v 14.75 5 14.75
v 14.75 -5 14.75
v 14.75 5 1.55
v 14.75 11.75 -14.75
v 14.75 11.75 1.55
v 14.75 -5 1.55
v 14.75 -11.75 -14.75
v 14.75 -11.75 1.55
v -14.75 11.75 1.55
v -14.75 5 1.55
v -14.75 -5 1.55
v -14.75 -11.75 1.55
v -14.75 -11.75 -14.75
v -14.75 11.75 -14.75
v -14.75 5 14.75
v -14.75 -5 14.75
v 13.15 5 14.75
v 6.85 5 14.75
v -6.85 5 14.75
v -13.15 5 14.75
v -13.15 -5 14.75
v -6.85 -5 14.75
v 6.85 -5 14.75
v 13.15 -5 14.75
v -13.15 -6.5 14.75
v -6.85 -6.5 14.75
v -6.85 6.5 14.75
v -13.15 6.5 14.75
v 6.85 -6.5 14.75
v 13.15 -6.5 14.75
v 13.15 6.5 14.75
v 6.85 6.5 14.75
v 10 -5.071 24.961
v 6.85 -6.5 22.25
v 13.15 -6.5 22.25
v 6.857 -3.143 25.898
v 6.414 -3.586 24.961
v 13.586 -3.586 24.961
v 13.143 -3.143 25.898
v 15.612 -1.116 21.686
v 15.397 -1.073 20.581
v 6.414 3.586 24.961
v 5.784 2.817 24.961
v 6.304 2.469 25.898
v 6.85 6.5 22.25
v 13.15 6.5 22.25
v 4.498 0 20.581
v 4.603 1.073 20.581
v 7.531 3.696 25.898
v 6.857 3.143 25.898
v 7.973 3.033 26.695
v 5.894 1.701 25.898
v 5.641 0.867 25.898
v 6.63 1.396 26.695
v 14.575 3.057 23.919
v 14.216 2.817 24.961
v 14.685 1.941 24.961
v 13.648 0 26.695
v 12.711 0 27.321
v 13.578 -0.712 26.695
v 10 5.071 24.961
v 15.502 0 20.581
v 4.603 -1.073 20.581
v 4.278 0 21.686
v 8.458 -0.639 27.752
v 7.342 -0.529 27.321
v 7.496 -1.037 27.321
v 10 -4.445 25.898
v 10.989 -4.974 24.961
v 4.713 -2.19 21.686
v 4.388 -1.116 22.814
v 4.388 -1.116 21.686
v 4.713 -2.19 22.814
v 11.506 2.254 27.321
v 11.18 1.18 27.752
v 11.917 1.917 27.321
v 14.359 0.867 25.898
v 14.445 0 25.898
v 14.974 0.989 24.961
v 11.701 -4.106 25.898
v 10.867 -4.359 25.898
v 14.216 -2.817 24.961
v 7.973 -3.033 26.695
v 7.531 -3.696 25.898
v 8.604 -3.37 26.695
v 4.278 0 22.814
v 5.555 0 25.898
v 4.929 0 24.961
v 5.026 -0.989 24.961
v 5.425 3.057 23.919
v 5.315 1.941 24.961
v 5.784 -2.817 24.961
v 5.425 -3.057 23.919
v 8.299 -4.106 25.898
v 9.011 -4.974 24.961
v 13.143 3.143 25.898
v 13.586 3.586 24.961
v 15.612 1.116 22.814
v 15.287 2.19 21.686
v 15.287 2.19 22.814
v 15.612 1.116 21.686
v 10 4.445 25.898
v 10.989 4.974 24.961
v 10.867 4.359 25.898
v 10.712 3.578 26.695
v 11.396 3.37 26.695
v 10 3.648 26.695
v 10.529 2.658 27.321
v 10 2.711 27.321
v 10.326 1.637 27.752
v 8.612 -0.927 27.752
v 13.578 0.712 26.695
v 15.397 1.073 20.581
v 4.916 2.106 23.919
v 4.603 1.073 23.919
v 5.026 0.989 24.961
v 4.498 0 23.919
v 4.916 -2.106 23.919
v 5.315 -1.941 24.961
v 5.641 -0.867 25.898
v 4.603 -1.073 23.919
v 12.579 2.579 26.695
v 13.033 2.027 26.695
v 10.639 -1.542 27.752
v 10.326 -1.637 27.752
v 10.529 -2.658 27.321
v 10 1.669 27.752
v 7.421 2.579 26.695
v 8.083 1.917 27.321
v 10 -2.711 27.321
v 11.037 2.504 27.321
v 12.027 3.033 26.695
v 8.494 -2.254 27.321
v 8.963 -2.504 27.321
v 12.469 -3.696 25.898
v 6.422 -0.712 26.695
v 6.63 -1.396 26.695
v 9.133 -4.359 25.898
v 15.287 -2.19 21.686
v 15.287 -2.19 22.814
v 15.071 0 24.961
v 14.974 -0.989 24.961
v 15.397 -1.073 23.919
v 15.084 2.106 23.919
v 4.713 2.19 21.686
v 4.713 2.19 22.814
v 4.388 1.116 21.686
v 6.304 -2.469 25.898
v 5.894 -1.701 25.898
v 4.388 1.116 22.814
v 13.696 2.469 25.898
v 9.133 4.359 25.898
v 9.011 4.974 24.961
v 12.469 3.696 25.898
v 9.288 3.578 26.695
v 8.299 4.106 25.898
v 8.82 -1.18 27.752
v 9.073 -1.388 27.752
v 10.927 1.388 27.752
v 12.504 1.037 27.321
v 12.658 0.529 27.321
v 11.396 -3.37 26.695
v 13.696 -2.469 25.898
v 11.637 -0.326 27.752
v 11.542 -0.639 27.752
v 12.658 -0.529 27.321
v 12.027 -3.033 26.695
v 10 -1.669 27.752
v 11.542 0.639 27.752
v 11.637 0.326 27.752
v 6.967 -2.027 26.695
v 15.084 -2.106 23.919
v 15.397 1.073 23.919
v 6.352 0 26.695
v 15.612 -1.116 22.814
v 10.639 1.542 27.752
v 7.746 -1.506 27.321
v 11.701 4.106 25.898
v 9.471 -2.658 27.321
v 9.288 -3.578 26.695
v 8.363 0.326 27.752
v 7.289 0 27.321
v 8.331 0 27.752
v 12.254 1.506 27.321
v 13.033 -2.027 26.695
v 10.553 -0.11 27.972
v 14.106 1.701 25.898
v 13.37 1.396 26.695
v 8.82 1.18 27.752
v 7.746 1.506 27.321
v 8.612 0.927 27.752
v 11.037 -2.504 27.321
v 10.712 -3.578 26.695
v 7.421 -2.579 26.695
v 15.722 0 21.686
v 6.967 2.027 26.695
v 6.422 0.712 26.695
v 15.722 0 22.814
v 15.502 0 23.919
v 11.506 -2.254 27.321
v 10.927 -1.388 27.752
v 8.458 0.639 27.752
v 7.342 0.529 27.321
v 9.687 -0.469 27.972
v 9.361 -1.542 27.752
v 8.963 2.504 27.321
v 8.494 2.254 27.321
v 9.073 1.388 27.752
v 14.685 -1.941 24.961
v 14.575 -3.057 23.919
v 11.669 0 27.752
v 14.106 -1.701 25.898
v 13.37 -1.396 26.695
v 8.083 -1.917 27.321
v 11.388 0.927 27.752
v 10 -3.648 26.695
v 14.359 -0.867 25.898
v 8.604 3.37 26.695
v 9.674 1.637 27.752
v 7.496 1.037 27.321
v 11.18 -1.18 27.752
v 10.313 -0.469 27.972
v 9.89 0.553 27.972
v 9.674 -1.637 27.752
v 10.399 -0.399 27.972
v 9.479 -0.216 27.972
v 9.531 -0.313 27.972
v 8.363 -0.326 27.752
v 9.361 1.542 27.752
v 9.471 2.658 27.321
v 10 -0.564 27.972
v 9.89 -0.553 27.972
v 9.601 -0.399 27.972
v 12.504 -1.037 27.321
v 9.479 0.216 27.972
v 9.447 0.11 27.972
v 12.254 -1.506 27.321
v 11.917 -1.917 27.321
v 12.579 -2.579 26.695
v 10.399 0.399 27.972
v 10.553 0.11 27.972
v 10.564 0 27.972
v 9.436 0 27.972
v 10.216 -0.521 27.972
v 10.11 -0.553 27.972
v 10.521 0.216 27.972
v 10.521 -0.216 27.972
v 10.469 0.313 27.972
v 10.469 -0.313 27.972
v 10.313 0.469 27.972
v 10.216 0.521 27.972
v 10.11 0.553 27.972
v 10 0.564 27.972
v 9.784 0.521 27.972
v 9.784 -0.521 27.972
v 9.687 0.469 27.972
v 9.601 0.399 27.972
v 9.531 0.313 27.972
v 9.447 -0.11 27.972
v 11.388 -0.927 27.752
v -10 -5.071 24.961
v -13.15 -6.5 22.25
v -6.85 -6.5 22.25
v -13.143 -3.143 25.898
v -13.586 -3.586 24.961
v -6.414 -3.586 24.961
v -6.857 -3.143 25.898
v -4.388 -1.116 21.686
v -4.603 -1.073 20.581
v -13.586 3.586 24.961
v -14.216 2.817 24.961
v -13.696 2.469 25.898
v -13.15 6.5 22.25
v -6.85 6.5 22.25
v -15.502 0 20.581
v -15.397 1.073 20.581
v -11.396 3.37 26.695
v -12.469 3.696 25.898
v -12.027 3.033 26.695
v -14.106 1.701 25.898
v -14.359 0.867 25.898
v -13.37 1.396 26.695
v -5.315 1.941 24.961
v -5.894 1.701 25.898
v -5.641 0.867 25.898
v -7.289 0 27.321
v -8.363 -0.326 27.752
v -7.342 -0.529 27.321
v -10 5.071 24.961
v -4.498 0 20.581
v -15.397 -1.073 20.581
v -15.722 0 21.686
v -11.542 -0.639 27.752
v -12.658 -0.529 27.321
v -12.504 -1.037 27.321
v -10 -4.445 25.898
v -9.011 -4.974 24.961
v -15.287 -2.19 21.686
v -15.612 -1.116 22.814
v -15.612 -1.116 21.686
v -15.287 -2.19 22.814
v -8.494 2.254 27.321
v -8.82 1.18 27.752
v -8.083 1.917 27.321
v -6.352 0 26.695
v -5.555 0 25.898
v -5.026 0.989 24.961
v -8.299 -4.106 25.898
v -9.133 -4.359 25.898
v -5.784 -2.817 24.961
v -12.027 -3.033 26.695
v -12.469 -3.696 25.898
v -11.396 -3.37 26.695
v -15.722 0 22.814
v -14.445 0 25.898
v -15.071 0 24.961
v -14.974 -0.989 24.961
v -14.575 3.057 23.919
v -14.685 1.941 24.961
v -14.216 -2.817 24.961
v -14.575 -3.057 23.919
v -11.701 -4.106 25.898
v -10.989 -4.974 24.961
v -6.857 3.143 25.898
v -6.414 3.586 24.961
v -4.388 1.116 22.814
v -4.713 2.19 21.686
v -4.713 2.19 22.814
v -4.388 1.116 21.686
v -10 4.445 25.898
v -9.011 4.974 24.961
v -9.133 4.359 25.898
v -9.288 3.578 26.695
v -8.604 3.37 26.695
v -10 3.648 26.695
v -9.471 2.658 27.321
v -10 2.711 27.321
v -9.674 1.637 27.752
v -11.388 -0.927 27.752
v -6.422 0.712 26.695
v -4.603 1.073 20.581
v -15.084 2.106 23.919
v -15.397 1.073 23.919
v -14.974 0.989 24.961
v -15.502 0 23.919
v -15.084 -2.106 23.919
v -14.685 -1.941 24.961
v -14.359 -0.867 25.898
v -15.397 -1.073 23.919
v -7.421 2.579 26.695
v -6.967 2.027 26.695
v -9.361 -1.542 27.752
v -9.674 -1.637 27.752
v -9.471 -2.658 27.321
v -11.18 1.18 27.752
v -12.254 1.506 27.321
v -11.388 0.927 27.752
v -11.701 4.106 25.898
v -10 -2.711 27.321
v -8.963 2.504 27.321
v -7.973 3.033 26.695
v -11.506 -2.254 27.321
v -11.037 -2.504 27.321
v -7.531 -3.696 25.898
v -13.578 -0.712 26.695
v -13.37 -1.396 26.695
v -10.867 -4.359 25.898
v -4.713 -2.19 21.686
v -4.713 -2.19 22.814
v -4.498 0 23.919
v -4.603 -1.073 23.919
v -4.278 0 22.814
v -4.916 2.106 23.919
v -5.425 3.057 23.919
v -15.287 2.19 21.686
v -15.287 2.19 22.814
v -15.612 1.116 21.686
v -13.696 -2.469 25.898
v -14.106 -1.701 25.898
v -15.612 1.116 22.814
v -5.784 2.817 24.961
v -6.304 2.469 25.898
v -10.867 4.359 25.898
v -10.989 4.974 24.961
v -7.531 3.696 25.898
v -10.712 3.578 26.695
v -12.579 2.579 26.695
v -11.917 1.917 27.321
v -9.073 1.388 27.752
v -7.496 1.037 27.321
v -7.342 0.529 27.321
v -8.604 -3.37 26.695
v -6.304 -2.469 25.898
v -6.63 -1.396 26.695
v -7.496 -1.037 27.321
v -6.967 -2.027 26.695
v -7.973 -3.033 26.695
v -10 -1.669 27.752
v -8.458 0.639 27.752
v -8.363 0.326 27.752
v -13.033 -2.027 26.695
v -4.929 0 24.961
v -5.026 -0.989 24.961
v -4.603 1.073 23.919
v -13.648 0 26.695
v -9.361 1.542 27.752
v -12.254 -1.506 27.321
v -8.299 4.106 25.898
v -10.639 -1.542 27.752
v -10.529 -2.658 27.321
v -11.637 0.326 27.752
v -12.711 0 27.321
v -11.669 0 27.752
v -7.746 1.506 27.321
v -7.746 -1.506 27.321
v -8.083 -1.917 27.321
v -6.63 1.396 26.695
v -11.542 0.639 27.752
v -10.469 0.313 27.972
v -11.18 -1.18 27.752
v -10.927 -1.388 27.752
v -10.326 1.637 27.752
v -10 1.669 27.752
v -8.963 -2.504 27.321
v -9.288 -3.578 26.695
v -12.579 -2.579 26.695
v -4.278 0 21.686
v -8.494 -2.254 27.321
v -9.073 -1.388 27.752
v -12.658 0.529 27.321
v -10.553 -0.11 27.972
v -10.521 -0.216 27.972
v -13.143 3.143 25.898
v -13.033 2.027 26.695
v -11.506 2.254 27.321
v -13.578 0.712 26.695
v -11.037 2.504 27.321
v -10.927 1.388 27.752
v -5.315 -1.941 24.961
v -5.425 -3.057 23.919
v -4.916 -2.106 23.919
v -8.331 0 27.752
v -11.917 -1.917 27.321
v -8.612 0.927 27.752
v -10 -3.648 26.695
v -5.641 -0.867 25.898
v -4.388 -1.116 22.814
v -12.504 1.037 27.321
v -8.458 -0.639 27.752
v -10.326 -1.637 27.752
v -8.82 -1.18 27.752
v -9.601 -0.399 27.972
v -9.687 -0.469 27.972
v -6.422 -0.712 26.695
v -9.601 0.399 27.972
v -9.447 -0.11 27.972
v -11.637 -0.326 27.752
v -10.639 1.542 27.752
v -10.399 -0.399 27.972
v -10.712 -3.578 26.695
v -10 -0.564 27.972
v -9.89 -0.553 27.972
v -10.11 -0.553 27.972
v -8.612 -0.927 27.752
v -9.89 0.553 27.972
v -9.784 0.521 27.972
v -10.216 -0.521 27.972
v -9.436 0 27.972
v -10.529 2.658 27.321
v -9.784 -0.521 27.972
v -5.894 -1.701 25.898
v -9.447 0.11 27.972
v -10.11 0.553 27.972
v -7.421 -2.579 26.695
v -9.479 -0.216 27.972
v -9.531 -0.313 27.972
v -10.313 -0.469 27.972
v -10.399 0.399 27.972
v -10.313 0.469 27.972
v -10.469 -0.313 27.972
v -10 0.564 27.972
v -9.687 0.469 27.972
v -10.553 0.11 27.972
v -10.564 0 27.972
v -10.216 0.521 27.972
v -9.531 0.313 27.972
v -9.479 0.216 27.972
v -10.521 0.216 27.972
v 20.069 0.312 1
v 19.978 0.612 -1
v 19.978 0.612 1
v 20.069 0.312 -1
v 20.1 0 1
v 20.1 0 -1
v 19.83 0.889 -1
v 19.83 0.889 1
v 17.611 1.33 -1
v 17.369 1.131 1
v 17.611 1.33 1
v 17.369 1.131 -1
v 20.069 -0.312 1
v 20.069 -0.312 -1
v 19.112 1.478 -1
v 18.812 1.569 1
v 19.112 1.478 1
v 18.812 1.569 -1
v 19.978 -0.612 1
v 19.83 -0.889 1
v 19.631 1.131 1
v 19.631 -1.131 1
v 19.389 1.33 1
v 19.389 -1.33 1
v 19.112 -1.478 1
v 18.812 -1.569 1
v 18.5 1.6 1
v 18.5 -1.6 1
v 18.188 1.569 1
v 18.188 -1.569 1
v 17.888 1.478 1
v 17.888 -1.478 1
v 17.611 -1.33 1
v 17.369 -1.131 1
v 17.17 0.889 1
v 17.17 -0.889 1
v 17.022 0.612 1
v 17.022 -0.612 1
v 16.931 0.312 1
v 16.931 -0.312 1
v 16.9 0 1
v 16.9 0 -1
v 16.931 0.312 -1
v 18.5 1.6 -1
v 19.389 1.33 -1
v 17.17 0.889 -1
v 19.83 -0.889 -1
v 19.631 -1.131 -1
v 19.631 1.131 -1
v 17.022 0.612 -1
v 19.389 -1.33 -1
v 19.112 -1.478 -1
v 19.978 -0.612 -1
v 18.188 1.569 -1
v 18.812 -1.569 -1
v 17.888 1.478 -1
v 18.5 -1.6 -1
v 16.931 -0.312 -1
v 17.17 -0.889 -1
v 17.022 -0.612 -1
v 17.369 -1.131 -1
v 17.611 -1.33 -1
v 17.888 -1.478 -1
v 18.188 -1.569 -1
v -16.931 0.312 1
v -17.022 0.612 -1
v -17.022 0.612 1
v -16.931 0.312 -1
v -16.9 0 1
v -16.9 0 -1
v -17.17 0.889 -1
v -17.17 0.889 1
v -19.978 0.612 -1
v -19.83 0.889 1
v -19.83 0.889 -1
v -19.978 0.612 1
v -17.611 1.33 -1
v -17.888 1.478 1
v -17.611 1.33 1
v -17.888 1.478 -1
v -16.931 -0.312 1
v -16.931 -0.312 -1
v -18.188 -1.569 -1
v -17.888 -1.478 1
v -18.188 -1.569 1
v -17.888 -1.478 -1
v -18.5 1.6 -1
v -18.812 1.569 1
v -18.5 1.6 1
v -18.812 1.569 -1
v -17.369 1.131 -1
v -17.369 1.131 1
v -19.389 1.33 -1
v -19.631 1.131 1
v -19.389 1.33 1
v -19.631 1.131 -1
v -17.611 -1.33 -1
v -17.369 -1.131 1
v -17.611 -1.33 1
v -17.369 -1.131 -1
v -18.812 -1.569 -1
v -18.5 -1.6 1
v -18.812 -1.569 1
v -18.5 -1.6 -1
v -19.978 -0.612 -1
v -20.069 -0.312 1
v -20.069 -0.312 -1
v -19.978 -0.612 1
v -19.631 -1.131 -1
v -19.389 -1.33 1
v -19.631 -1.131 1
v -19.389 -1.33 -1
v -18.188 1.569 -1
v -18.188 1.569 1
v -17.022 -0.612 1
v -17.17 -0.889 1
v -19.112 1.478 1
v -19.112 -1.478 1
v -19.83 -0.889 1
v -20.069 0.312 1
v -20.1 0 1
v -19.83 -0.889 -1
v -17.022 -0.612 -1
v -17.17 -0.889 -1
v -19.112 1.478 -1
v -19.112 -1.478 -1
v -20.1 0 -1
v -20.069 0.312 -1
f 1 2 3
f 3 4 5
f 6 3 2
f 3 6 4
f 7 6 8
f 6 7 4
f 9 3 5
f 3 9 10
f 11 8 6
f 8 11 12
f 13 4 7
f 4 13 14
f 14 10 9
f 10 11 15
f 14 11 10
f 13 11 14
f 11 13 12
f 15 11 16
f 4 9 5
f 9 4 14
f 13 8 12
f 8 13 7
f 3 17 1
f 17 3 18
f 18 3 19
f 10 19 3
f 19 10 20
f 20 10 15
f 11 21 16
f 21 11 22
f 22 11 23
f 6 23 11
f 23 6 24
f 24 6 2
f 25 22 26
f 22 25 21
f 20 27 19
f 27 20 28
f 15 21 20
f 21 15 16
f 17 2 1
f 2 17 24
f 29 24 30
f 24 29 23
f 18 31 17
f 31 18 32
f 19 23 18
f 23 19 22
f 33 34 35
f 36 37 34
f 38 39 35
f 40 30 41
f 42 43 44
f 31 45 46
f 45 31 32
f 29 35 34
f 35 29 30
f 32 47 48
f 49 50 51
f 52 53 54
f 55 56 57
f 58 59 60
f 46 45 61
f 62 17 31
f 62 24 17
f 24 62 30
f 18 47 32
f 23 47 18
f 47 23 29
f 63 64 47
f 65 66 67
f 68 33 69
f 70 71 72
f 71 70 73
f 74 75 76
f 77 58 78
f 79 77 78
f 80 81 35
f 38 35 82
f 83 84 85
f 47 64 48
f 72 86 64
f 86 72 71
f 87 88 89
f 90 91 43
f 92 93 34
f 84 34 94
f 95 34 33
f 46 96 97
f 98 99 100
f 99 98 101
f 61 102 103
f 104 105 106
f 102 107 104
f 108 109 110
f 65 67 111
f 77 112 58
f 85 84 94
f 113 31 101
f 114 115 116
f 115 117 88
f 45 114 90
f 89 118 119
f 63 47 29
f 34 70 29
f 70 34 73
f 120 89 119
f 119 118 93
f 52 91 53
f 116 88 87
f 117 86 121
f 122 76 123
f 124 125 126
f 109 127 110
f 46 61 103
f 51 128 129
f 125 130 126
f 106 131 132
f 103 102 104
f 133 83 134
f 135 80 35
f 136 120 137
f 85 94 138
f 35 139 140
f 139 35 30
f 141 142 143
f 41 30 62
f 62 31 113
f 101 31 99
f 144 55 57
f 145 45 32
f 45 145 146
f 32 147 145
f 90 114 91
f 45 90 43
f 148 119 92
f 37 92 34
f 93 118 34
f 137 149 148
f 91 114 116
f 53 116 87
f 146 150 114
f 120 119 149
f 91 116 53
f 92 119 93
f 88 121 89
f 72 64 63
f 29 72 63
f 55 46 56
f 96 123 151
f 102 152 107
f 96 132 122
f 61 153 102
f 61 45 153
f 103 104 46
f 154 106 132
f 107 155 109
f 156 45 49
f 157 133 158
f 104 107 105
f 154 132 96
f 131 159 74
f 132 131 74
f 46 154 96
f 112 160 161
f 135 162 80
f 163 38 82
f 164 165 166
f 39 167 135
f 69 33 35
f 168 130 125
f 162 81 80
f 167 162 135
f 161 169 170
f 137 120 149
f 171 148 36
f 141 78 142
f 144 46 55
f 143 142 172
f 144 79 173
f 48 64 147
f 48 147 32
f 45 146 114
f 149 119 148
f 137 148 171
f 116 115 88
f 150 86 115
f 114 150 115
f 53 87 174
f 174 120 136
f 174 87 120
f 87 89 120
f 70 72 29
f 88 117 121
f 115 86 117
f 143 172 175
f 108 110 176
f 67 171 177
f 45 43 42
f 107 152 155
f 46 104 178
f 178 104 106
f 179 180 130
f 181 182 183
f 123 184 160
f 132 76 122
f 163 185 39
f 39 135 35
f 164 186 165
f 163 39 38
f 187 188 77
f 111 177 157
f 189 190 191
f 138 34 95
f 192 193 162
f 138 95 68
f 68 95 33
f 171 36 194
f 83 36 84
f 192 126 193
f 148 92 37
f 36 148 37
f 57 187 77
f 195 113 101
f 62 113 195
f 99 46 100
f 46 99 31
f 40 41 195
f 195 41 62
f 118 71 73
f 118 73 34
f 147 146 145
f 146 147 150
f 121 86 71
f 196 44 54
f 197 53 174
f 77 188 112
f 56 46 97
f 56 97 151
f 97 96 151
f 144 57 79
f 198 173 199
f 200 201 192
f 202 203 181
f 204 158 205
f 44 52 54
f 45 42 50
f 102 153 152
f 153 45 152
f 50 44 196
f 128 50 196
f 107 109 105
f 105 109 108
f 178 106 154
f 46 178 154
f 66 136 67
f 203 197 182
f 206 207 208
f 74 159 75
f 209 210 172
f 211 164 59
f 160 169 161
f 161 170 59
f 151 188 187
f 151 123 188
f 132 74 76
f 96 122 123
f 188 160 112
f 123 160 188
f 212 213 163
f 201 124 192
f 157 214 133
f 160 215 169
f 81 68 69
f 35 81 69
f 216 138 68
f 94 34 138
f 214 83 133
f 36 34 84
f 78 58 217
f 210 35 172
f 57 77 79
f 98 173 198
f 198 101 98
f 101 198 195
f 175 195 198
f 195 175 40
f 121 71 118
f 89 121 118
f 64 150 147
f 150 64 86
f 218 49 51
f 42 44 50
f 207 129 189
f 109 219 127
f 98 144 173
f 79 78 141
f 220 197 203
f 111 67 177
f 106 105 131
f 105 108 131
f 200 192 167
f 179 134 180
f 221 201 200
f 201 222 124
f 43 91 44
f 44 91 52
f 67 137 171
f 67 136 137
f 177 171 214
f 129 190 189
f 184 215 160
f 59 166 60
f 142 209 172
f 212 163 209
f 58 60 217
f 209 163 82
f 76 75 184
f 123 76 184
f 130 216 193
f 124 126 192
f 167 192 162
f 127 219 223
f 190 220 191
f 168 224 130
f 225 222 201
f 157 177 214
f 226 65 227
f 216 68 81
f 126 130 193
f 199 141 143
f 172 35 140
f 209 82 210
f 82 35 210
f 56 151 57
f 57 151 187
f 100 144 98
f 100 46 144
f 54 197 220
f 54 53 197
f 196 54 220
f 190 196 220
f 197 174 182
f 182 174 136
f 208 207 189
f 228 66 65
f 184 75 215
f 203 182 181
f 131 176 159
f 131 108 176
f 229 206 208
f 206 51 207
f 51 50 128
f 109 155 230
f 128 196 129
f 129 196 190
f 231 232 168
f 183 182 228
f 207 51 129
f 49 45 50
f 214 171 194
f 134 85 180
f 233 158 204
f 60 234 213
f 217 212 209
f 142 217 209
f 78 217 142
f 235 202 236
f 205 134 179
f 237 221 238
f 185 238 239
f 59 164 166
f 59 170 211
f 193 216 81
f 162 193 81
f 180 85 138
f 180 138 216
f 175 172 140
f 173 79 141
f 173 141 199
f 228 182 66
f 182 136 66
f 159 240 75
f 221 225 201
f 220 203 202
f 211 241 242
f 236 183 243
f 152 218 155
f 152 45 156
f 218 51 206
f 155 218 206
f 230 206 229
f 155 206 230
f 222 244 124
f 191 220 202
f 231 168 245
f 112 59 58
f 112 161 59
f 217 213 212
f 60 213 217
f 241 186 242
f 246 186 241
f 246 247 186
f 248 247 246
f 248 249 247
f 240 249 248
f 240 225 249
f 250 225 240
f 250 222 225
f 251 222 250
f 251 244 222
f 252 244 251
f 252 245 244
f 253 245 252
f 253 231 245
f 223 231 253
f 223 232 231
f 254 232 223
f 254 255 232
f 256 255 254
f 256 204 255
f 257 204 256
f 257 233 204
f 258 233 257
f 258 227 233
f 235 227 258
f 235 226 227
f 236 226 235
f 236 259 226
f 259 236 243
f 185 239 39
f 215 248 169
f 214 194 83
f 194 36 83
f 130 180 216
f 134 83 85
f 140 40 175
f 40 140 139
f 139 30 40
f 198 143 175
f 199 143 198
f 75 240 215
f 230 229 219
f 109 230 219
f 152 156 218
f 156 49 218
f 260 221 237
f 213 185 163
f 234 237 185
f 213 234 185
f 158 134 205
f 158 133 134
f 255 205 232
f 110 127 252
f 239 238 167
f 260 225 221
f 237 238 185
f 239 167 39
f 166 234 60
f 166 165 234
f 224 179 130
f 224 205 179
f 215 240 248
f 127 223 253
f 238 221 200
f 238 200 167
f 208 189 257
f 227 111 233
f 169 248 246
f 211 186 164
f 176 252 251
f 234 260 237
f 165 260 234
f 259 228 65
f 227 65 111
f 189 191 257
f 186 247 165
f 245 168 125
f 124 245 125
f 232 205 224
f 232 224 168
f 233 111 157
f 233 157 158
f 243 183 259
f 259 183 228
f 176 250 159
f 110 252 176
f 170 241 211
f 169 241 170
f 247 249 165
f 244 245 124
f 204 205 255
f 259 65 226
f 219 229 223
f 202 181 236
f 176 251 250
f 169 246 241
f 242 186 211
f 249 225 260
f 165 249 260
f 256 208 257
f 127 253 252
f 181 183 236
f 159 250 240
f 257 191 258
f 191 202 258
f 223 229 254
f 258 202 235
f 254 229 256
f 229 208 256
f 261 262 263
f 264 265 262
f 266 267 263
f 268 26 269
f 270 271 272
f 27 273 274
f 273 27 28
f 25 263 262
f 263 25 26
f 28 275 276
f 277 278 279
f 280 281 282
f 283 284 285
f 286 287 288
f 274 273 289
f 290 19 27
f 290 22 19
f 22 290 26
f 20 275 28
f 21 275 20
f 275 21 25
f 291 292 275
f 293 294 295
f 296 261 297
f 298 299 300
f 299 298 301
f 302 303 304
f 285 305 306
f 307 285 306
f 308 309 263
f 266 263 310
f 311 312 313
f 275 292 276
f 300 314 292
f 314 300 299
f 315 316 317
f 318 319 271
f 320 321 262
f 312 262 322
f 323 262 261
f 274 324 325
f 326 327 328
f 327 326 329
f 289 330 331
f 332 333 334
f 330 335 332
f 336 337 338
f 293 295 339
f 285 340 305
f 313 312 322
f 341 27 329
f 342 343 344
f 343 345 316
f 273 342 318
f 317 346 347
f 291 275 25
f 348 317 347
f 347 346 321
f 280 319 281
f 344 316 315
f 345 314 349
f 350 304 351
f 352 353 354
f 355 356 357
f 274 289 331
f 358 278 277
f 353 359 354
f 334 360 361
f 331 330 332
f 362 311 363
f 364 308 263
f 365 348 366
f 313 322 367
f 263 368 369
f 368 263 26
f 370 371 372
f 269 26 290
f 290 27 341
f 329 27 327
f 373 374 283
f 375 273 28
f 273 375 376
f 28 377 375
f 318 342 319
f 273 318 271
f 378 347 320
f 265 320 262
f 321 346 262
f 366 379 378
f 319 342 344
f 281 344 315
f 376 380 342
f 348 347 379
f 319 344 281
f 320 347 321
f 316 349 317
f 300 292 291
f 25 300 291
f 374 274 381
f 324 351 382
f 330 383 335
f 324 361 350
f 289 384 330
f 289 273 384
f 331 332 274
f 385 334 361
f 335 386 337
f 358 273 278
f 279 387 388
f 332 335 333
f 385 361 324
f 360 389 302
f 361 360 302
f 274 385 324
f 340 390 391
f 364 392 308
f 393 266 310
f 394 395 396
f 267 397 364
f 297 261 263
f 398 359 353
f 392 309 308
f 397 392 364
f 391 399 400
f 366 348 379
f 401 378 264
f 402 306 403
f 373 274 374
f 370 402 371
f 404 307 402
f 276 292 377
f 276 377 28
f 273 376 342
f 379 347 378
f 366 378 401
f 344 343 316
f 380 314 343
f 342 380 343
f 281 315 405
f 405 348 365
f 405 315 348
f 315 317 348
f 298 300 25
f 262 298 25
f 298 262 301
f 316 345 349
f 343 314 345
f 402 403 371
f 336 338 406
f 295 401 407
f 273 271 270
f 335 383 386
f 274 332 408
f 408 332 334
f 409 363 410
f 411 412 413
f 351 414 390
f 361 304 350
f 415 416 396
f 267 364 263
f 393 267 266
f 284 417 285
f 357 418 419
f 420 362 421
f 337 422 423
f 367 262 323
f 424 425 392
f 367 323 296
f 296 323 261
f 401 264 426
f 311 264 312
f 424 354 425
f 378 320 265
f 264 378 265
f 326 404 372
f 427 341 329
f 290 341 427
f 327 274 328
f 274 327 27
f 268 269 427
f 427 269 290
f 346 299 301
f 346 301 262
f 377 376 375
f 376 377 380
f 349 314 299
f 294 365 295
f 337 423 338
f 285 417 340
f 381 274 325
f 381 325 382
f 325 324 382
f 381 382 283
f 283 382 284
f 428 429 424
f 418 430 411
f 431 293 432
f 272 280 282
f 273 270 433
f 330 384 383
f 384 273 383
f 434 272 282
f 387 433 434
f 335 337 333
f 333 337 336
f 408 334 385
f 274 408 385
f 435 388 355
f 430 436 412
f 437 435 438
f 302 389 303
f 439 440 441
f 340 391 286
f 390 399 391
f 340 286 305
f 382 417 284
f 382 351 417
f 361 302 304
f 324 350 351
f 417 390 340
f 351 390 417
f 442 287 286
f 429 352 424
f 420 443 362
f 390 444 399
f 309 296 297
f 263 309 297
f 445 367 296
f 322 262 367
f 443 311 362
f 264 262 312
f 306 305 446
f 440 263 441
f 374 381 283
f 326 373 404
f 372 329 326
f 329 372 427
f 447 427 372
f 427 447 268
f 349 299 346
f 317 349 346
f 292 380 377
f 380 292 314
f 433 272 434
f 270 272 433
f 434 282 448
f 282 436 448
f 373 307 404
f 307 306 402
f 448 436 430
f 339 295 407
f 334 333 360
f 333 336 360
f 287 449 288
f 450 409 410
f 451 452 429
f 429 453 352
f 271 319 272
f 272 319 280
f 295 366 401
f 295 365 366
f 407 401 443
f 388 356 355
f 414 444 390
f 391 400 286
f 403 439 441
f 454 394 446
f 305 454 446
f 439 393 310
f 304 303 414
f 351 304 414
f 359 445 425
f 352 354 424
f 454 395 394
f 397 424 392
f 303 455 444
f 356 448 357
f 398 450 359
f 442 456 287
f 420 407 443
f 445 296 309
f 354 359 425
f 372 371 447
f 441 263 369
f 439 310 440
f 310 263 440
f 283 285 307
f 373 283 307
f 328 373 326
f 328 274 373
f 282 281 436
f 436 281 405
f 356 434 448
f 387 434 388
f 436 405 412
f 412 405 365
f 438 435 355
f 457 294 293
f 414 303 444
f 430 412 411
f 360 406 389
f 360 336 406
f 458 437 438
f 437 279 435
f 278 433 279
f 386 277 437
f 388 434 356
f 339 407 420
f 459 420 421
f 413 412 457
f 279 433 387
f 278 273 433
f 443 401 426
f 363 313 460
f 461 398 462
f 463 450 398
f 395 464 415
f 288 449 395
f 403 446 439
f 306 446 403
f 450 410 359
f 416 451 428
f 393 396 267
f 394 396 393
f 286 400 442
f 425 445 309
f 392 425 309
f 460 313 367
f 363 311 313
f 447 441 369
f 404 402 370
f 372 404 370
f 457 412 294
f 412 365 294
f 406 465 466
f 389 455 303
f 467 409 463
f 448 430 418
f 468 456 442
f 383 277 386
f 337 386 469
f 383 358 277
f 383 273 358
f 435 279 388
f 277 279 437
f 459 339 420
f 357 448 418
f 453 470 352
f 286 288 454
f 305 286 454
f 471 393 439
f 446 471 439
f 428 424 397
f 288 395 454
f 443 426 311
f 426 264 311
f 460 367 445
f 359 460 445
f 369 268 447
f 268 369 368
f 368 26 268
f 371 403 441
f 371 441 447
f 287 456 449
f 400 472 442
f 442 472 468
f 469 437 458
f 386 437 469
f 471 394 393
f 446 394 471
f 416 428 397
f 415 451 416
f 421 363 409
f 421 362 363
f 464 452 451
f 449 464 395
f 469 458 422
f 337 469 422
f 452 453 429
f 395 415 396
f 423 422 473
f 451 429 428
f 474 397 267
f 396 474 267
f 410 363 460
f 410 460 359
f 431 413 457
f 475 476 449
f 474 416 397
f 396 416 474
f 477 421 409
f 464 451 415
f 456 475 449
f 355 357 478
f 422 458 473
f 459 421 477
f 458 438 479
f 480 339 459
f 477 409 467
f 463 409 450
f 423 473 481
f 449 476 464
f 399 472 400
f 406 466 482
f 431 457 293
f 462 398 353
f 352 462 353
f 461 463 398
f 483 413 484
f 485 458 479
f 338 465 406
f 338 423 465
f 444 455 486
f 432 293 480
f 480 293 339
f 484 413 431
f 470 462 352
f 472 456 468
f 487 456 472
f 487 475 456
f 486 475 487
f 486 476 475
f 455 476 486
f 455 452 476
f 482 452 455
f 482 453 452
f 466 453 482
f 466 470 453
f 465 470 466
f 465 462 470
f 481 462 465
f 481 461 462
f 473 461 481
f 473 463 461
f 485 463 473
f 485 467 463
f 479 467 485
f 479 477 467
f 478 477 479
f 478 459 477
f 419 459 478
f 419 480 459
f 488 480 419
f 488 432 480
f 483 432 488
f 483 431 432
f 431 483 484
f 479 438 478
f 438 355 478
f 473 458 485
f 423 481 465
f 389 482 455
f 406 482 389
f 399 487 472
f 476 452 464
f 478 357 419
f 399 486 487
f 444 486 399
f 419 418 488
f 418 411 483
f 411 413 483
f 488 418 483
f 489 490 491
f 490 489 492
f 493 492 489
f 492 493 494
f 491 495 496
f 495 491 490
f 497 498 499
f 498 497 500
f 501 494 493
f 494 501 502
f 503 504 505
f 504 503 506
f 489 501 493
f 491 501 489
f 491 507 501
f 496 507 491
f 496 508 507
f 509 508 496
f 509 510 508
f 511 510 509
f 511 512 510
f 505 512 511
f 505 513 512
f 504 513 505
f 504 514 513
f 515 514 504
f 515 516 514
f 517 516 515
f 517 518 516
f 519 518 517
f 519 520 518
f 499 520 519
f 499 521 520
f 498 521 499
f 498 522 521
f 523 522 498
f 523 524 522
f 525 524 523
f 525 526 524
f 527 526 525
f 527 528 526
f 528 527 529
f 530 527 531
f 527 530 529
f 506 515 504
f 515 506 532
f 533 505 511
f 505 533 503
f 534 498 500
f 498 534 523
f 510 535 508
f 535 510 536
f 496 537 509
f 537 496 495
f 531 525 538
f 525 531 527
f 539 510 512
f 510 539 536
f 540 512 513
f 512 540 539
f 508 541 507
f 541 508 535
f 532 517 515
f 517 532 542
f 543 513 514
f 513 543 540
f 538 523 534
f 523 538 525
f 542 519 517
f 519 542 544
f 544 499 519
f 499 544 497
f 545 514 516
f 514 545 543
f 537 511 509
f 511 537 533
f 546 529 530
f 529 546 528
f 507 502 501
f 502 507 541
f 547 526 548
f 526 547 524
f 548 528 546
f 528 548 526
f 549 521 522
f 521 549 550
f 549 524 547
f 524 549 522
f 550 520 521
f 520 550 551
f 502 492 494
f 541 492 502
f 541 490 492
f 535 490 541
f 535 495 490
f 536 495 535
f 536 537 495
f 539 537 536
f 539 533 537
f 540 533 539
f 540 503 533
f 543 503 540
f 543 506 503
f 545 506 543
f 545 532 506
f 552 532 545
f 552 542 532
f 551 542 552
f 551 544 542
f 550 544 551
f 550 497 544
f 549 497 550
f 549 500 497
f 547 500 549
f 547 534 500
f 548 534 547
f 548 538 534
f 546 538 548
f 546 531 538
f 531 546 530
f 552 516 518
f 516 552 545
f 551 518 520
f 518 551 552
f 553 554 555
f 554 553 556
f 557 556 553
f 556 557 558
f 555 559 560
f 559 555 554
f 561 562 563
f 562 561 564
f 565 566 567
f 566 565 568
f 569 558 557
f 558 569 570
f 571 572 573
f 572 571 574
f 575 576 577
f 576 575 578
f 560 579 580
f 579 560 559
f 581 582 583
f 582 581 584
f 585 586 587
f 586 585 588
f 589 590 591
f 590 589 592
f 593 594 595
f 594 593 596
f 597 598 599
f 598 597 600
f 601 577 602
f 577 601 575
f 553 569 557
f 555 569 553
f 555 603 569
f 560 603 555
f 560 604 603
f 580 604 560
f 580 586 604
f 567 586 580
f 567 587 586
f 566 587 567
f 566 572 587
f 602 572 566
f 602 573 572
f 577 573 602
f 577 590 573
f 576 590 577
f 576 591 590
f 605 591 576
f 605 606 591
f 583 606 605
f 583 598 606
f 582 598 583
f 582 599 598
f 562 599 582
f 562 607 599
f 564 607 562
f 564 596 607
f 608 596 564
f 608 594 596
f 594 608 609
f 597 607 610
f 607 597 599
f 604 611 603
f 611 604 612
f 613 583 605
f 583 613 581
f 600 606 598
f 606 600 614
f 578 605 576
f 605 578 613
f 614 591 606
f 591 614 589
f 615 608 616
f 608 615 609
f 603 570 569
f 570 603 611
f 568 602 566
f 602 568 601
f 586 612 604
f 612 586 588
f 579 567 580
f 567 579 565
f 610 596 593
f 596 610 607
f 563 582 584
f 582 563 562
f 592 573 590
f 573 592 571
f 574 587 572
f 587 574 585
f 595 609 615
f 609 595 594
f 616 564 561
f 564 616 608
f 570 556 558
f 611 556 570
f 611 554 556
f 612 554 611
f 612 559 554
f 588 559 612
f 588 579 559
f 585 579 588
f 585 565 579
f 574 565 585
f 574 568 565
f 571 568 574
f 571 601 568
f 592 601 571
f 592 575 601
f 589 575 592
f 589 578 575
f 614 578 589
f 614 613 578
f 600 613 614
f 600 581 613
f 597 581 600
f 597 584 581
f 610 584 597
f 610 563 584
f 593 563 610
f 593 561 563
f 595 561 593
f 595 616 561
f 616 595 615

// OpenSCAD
// Sharp GP2Y0A21YK0F Distance Sensor Modeling
// Coordinates: Origin at body center, Mounting face (Connector side) at -Z.
// Units: mm

$fn = 32;

// --- Dimensions ---
// Main body dimensions
body_w = 29.5;       // Total body width (X)
body_h = 23.5;       // Total body height (Y)
body_l = 29.5;       // Total body length (Z)

// Segment dimensions (from side view)
back_l = 16.3;       // Length of the rear section
mid_l = 4.15;        // Length of the middle step
front_l = body_l - back_l - mid_l; // Remaining length for the front face

// Component dimensions
base_h = 13.5;       // Height of the base part
top_h = body_h - base_h; // Height of the top part
lens_case_w = 6.3;   // Width of the lens housing
lens_case_h = 13.0;  // Height of the lens housing
lens_case_l = 7.5;   // Length of the lens housing protrusion
lens_dist = 20.0;    // Distance between lens centers
conn_w = 14.75;      // Width of the connector
conn_t = 1.2;        // Thickness of the PWB/Connector

// --- Modules ---

module body_segment(w, h, l, z_offset) {
    translate([0, 0, z_offset])
    cube([w, h, l], center=true);
}

module lens_housing(x_pos) {
    // The lens housing sticks out from the front face
    // The front face is at Z = body_l / 2
    translate([x_pos, 0, (body_l / 2) + (lens_case_l / 2)])
    hull() {
        // Main block of the lens housing
        translate([0, 0, 0])
        cube([lens_case_w, lens_case_h, lens_case_l], center=true);
        
        // Rounded front edge (R5.75 is specified in the drawing)
        translate([0, 0, lens_case_l / 2])
        sphere(r = 5.75);
    }
}

module connector() {
    // Connector is at the bottom back corner
    // Width 14.75, Thickness 1.2
    translate([0, -base_h / 2 + (base_h - conn_t) / 2, -(body_l / 2) + (back_l / 2)])
    cube([conn_w, conn_t, back_l], center=true);
}

// --- Assembly ---

// 1. Main Body Construction
// We divide the body into 3 sections along the Z-axis to match the "Outline Dimensions" side view
// Back section (Height = 23.5)
translate([0, 0, -(body_l / 2) + (back_l / 2)])
    body_segment(body_w, body_h, back_l);

// Middle section (Height = 10) - Step down
translate([0, 0, -(body_l / 2) + back_l + (mid_l / 2)])
    body_segment(body_w, top_h, mid_l);

// Front section (Height = 10)
translate([0, 0, (body_l / 2) - (front_l / 2)])
    body_segment(body_w, top_h, front_l);

// 2. Lens Housings
// Distance between centers is 20mm (X = +/- 10)
lens_housing(lens_dist / 2);
lens_housing(-lens_dist / 2);

// 3. Connector
connector();

// 4. Mounting Holes (Reference only, as per φ3.2mm)
// Positioned at the ends of the 37mm total width (approx X = +/- 18.5)
translate([18.5, 0, 0]) cylinder(h=2, d=3.2, center=true);
translate([-18.5, 0, 0]) cylinder(h=2, d=3.2, center=true);

// --- Aesthetics (Optional) ---
%color("LightGray", opacity=0.5) body_segment(body_w, body_h, body_l, 0);
